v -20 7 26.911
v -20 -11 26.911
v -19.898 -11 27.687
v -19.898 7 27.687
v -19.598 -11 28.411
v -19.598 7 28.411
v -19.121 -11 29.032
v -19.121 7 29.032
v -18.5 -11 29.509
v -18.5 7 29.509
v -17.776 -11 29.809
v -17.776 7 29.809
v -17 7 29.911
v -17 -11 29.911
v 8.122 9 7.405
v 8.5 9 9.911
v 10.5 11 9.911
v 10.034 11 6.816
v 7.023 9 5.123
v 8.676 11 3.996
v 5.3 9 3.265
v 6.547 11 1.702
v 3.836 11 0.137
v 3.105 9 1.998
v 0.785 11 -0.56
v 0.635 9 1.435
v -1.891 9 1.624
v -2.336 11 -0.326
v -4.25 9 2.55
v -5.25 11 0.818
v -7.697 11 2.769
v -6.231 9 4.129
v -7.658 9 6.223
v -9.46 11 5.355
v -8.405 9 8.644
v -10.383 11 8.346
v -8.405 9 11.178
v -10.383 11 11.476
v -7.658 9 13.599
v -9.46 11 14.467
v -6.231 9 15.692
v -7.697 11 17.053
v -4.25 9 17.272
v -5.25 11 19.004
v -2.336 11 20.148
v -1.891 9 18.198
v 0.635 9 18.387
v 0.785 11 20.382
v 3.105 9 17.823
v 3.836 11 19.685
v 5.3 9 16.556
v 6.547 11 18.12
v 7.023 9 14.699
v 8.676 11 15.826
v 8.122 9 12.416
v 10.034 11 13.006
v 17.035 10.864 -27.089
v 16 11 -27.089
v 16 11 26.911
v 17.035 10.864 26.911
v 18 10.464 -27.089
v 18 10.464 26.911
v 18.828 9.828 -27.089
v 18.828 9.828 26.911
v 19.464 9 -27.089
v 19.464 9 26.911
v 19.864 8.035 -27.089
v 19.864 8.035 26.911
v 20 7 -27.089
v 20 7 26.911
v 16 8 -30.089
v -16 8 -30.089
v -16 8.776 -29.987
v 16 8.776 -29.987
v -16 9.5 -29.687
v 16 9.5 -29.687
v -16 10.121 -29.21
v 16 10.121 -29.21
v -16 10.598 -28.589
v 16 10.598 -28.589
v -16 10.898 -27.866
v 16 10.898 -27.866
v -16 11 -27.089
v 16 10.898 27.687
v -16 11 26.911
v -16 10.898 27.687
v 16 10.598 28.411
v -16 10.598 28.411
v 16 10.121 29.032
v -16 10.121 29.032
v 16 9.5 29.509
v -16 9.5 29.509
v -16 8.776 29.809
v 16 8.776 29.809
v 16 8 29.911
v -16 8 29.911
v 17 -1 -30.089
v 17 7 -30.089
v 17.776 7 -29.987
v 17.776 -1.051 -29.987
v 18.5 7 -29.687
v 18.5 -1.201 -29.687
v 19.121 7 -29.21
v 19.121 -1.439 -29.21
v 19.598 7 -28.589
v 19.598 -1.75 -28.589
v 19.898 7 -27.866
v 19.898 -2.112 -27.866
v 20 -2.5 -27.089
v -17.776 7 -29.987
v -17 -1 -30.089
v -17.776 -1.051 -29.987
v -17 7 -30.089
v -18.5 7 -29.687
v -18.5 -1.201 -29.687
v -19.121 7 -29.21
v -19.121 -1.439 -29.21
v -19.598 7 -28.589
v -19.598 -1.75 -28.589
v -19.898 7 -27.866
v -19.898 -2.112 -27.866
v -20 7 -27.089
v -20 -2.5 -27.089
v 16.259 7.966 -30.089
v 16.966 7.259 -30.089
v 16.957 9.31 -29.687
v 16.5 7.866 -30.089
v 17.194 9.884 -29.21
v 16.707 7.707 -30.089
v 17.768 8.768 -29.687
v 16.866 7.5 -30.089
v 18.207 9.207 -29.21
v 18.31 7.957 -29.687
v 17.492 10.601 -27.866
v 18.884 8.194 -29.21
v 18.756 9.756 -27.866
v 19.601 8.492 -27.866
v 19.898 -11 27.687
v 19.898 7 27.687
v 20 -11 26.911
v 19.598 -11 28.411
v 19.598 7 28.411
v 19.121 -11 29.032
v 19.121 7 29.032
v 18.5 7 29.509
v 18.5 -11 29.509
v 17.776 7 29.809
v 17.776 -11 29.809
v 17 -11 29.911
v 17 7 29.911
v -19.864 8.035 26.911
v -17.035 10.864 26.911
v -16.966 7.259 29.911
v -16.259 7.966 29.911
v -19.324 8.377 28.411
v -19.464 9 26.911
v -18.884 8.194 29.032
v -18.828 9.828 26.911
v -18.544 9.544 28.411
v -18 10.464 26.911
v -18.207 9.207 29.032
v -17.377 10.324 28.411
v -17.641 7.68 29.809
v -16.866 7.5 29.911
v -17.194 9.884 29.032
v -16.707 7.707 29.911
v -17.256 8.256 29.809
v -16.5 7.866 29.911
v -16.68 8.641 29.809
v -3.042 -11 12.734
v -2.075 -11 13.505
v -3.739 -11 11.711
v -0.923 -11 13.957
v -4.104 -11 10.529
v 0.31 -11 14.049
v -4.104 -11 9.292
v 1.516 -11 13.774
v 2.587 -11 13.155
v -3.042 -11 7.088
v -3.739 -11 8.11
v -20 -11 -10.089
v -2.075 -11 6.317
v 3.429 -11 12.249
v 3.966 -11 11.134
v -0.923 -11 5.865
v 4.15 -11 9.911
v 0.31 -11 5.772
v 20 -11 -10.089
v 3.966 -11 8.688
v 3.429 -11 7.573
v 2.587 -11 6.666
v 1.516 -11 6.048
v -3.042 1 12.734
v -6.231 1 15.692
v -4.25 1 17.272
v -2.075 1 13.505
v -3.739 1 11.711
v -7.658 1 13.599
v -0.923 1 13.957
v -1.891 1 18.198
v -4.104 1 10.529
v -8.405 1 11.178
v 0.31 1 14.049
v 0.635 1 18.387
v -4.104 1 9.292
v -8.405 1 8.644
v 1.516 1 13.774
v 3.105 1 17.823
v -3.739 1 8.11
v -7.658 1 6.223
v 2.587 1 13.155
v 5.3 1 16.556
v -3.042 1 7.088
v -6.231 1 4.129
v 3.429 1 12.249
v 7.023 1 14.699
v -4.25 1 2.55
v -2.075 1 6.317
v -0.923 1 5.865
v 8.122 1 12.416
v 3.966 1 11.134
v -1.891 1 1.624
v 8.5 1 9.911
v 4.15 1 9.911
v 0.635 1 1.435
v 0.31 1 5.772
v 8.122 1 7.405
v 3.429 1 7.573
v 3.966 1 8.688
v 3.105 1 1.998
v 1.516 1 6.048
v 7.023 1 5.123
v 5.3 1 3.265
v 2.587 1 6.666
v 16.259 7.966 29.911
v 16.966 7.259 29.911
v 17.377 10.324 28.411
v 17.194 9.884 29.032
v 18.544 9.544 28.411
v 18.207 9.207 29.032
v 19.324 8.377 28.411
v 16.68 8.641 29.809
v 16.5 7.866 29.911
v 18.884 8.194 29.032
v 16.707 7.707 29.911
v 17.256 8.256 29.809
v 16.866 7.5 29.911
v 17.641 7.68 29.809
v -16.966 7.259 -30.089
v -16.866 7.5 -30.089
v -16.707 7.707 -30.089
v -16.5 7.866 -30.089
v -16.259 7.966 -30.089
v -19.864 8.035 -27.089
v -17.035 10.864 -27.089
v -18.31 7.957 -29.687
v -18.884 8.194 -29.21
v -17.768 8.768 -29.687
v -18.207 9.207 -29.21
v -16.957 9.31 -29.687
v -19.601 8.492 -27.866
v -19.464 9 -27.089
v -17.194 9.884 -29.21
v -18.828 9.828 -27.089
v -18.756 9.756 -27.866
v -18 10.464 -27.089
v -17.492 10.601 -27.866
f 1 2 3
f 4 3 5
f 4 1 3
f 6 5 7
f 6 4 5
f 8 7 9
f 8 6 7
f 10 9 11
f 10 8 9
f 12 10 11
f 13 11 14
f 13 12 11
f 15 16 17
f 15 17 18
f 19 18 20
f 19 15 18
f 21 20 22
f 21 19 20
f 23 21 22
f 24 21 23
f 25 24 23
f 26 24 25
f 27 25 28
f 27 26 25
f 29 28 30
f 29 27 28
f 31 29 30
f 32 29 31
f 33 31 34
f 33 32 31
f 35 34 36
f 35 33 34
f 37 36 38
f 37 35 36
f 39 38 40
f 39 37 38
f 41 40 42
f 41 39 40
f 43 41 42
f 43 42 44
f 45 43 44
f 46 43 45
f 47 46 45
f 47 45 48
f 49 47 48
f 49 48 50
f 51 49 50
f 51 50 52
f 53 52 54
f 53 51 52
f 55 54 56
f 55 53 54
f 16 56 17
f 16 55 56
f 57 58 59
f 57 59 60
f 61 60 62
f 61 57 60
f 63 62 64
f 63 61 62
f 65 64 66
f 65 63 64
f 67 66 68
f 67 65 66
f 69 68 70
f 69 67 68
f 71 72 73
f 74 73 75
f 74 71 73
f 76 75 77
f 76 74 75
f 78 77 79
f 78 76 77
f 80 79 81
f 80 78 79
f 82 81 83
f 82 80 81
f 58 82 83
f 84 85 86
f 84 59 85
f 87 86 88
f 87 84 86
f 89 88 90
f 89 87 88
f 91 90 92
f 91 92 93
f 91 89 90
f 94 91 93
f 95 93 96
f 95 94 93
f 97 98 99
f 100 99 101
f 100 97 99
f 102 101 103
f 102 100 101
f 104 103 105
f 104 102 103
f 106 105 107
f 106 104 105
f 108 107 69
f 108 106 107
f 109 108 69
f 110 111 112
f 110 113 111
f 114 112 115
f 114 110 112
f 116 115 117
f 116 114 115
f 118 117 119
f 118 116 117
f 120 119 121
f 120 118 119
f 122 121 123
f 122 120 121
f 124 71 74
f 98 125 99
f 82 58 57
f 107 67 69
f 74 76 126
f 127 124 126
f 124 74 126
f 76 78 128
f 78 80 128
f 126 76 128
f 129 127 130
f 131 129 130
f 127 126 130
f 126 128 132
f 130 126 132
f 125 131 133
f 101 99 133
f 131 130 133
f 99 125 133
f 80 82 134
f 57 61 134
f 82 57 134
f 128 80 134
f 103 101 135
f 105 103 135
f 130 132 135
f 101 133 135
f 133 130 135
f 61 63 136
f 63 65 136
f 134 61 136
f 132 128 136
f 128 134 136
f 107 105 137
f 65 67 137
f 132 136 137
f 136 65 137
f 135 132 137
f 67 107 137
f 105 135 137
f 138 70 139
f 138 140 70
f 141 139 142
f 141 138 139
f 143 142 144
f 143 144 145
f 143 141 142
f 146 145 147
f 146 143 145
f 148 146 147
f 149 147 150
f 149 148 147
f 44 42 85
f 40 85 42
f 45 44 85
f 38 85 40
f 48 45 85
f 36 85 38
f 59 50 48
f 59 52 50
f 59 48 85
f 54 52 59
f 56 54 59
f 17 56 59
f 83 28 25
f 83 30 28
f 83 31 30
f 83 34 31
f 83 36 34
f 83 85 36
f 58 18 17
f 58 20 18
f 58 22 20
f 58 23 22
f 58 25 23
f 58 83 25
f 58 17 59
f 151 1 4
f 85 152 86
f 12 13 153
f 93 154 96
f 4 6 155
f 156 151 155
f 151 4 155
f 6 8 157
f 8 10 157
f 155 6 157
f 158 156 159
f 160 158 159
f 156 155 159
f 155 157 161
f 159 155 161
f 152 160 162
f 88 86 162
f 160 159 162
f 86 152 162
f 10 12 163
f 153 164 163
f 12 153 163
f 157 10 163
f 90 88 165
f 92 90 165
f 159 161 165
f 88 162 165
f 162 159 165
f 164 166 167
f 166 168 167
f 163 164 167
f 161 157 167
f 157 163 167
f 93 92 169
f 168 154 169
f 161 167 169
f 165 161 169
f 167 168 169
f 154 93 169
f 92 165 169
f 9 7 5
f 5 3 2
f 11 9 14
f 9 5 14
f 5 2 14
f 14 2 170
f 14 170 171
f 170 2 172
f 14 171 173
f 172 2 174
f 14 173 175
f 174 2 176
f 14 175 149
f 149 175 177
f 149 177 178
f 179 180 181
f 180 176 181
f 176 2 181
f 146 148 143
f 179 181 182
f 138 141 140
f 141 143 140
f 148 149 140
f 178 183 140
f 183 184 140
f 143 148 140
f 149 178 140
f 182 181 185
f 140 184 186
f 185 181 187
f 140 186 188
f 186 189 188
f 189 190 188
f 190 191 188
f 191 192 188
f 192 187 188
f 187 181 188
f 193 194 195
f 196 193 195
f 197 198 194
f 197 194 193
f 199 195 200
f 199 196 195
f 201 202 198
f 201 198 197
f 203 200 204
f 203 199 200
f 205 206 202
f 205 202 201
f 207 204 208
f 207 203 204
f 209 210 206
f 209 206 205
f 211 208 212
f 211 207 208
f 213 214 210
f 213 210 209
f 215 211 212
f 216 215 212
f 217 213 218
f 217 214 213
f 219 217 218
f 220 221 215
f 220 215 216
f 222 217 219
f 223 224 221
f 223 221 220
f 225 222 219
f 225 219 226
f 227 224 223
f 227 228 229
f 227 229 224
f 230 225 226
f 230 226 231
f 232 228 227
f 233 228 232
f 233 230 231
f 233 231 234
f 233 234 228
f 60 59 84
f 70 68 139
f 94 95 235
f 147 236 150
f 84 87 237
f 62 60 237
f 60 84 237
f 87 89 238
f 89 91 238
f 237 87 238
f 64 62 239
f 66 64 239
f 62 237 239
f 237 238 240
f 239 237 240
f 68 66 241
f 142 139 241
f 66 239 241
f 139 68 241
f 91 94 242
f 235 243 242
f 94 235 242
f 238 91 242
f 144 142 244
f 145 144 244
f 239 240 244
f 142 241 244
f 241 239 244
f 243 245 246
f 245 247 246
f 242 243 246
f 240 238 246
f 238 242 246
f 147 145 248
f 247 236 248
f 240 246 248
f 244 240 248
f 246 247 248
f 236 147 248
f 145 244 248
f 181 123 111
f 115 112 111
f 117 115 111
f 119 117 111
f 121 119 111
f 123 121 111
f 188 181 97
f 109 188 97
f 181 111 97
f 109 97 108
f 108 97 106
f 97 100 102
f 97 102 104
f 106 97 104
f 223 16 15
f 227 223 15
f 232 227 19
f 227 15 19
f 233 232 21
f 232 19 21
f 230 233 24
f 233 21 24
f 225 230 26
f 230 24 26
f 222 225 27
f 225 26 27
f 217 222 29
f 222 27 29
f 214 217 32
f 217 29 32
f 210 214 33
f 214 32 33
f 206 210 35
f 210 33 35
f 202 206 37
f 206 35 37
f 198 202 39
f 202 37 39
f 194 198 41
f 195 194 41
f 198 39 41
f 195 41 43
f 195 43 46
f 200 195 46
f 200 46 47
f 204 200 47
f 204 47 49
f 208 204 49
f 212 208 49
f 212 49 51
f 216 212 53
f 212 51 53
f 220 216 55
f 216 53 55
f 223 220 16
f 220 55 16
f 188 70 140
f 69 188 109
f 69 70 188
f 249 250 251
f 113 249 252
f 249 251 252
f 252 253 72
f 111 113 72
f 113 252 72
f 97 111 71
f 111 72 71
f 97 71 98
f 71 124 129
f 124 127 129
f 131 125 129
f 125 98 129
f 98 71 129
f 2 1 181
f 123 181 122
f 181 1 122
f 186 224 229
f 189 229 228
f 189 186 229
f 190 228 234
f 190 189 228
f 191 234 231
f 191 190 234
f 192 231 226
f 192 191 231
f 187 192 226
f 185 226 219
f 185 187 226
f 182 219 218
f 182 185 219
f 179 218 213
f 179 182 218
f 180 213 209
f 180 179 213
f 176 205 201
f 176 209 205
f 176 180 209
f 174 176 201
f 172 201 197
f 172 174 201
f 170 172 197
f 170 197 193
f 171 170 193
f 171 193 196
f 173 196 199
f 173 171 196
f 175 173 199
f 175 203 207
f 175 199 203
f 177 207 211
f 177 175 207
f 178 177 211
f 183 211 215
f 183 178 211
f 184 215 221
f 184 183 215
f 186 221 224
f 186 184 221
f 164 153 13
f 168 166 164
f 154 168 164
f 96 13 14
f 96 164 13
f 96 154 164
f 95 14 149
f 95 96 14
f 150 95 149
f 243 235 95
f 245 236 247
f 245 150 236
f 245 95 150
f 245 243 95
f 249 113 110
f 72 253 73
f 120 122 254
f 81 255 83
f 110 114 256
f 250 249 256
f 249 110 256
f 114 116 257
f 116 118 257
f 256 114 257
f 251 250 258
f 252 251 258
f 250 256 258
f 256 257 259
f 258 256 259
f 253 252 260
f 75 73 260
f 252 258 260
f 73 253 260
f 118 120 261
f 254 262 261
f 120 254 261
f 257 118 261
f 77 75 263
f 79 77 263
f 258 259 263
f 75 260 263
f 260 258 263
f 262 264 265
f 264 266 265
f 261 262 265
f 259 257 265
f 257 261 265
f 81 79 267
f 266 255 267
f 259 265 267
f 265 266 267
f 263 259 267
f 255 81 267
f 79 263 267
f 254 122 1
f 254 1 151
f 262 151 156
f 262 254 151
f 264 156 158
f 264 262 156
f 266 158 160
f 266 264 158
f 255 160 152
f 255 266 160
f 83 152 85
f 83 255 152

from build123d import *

# Parameters (mm, degrees)
SKETCH1_W           = 40
SKETCH1_H           = 60
SKETCH1_R           = 4.15
BOSS_EXTRUDE1_DEPTH = 11
SKETCH2_R           = 8.5
CUT_EXTRUDE1_DEPTH  = 10
FILLET1_R           = 4
CHAMFER1_SIZE       = 2
CHAMFER2_SIZE       = 20
CHAMFER2_SIZE2      = 10
FILLET2_R           = 3


with BuildPart() as part:
    # Sketch1 → Boss-Extrude1 (new body, symmetric)
    with BuildSketch(Plane(origin=(0, 0, 0), x_dir=(1, 0, 0), z_dir=(0, 1, 0))):
        with Locations((0, 0.089127558)):
            Rectangle(SKETCH1_W, SKETCH1_H)
        with Locations((0, -9.910872442)):
            Circle(SKETCH1_R, mode=Mode.SUBTRACT)
    extrude(amount=BOSS_EXTRUDE1_DEPTH, both=True)

    # Sketch2 → Cut-Extrude1 (cut)
    with BuildSketch(Plane(origin=(0, 11, 0), x_dir=(1, 0, 0), z_dir=(0, 1, 0))):
        with Locations((0, -9.910872442)):
            Circle(SKETCH2_R)
    extrude(amount=-CUT_EXTRUDE1_DEPTH, mode=Mode.SUBTRACT)

    # Fillet1
    fillet1_edges = [part.edges().sort_by_distance(p)[0] for p in [
        (-20, 11, -0.089127558),
        (20, 11, -0.089127558),
    ]]
    fillet(fillet1_edges, radius=FILLET1_R)

    # Chamfer1
    chamfer1_edges = [part.edges().sort_by_distance(p)[0] for p in [
        (-8.5, 11, 9.910872442),
    ]]
    chamfer(chamfer1_edges, length=CHAMFER1_SIZE)

    # Chamfer2
    chamfer2_edges = [part.edges().sort_by_distance(p)[0] for p in [
        (0, -11, -30.089127558),
    ]]
    chamfer2_side = [part.faces().sort_by_distance(p)[0] for p in [
        (0, -11, -0.319769187),
    ]]
    chamfer(chamfer2_edges, length=CHAMFER2_SIZE, length2=CHAMFER2_SIZE2, reference=chamfer2_side[0])

    # Fillet2
    fillet2_edges = [part.edges().sort_by_distance(p)[0] for p in [
        (0, 11, -30.089127558),
        (0, 11, 29.910872442),
        (20, -2, 29.910872442),
        (-20, -2, 29.910872442),
        (18.828427125, 9.828427125, 29.910872442),
        (-18.828427125, 9.828427125, 29.910872442),
        (-20, 3, -30.089127558),
        (20, 3, -30.089127558),
        (18.828427125, 9.828427125, -30.089127558),
        (-18.828427125, 9.828427125, -30.089127558),
    ]]
    fillet(fillet2_edges, radius=FILLET2_R)


solid = part.part
